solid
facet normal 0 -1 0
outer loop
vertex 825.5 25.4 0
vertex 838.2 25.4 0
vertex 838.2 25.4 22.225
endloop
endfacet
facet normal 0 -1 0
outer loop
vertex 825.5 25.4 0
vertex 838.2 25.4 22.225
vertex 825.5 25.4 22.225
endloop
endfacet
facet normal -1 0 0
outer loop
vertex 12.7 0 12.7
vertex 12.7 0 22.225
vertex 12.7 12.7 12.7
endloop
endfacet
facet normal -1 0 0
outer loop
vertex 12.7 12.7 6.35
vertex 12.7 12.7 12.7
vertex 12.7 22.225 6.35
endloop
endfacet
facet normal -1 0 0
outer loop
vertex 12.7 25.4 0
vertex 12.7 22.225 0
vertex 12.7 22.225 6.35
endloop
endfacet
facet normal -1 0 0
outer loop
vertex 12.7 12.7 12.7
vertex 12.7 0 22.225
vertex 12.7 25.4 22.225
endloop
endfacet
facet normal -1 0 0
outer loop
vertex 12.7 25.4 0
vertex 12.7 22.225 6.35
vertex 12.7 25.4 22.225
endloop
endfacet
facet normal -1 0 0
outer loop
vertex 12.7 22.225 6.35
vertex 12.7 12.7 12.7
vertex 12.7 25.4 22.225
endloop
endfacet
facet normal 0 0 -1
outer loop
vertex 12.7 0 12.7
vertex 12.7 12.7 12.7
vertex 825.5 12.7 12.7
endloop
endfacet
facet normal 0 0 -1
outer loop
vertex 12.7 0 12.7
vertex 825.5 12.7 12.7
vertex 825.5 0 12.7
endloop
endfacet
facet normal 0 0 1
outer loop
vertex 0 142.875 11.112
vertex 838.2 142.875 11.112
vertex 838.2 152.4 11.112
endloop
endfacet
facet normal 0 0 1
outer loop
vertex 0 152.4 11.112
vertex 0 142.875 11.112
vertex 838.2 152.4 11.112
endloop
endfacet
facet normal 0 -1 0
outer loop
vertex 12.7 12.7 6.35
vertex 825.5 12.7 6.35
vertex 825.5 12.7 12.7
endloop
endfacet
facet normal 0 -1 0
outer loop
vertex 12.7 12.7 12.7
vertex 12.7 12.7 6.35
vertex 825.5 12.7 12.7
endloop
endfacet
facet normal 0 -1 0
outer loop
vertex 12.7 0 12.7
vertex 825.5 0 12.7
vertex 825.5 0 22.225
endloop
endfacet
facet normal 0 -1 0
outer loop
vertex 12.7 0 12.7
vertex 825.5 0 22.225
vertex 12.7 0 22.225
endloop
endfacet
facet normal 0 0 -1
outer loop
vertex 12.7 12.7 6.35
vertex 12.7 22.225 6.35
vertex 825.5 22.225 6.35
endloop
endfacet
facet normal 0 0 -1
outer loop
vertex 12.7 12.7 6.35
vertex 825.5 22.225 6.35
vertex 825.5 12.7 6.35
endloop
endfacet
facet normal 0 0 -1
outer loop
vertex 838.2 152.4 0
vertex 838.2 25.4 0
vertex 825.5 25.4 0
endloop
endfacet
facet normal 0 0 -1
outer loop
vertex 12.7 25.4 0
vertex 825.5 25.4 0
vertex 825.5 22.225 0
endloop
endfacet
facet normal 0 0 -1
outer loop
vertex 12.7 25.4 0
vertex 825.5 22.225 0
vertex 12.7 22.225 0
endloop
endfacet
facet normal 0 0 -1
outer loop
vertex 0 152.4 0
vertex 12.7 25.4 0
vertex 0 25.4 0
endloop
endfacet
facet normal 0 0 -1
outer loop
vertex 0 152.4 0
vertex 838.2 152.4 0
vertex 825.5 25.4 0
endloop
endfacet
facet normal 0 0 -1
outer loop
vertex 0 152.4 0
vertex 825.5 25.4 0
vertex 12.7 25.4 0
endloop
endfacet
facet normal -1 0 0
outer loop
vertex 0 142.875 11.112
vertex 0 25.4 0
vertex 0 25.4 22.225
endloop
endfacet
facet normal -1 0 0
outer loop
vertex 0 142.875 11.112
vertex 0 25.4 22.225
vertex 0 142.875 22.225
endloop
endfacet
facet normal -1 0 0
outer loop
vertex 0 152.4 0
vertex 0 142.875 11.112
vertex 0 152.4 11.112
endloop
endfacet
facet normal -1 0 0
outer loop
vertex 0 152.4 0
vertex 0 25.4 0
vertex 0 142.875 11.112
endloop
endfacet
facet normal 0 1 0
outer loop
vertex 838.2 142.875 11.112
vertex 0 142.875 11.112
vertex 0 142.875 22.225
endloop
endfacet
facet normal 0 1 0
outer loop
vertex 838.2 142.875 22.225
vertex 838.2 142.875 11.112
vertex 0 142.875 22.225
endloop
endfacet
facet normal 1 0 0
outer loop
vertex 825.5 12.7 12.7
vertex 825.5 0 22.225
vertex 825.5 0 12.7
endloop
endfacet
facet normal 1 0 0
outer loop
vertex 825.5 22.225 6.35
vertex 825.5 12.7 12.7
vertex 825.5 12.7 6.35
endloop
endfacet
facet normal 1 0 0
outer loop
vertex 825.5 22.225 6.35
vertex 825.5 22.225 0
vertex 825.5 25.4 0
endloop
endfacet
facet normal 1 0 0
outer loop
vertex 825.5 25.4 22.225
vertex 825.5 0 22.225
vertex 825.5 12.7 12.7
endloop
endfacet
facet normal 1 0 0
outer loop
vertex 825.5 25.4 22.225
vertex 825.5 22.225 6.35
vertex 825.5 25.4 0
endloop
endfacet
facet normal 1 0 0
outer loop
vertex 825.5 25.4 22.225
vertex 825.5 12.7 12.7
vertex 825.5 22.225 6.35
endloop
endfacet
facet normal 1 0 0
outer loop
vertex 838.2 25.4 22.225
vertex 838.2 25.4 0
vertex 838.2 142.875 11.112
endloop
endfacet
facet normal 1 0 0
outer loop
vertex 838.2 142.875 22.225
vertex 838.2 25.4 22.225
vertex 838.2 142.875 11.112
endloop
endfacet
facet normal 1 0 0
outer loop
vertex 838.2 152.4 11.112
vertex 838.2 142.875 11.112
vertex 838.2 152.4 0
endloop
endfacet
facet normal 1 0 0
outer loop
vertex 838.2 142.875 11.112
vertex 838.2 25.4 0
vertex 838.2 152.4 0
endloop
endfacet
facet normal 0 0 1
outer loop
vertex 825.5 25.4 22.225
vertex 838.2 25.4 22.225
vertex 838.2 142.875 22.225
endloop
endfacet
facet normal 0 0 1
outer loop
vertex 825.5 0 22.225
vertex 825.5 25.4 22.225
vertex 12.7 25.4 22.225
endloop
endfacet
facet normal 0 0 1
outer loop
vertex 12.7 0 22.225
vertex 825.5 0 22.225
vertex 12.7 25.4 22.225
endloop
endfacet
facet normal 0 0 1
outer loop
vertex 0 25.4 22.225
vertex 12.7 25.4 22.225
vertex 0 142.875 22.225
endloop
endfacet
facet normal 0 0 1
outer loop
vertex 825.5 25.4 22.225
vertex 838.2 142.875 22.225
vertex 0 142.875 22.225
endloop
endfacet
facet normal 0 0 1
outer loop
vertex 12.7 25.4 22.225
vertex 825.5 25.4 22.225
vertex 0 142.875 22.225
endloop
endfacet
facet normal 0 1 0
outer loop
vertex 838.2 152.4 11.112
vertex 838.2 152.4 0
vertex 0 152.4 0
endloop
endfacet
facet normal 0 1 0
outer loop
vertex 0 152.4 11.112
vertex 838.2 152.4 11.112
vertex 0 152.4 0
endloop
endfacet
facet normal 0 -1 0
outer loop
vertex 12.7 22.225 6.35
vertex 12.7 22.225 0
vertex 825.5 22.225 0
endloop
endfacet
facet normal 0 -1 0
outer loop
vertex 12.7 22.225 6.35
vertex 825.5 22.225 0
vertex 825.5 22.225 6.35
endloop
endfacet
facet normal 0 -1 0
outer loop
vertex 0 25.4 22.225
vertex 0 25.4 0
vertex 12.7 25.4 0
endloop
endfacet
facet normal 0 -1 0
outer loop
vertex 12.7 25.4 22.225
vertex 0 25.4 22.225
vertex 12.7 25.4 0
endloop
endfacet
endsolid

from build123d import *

# Parameters (mm, degrees)
F0_W     = 419.1
F0_H     = 152.4
F1_DEPTH = 22.225
F2_W     = 12.7
F2_H     = 25.4
F3_DEPTH = 22.226
F4_W     = 9.525
F4_H     = 11.1125
F5_DEPTH = 419.101


with BuildPart() as f1:
    # F0 (on Top) → F1 (new body)
    with BuildSketch(Plane.XY):
        with Locations((209.55, 76.2)):
            Rectangle(F0_W, F0_H)
    extrude(amount=F1_DEPTH)

    # F2 (on face) → F3 (cut, through all)
    with BuildSketch(Plane.XY.offset(22.225)):
        with Locations((6.35, 12.7)):
            Rectangle(F2_W, F2_H)
    extrude(amount=-F3_DEPTH, mode=Mode.SUBTRACT)

    # F4 (on face) → F5 (cut, through all)
    with BuildSketch(Plane.YZ.offset(419.1)):
        Polygon((12.7, 12.7), (0, 12.7), (0, 0), (22.225, 0), (22.225, 6.35), (12.7, 6.35), align=None)
        with Locations((147.6375, 16.66875)):
            Rectangle(F4_W, F4_H)
    extrude(amount=-F5_DEPTH, mode=Mode.SUBTRACT)

    # F6: F1 across face


with BuildPart() as f1_1:
    add(f1.part)
    add(f1.part.mirror(Plane(origin=(419.1, 78.572096, 11.328264), x_dir=(0, 1, 0), z_dir=(1, 0, 0))))


solid = f1_1.part
